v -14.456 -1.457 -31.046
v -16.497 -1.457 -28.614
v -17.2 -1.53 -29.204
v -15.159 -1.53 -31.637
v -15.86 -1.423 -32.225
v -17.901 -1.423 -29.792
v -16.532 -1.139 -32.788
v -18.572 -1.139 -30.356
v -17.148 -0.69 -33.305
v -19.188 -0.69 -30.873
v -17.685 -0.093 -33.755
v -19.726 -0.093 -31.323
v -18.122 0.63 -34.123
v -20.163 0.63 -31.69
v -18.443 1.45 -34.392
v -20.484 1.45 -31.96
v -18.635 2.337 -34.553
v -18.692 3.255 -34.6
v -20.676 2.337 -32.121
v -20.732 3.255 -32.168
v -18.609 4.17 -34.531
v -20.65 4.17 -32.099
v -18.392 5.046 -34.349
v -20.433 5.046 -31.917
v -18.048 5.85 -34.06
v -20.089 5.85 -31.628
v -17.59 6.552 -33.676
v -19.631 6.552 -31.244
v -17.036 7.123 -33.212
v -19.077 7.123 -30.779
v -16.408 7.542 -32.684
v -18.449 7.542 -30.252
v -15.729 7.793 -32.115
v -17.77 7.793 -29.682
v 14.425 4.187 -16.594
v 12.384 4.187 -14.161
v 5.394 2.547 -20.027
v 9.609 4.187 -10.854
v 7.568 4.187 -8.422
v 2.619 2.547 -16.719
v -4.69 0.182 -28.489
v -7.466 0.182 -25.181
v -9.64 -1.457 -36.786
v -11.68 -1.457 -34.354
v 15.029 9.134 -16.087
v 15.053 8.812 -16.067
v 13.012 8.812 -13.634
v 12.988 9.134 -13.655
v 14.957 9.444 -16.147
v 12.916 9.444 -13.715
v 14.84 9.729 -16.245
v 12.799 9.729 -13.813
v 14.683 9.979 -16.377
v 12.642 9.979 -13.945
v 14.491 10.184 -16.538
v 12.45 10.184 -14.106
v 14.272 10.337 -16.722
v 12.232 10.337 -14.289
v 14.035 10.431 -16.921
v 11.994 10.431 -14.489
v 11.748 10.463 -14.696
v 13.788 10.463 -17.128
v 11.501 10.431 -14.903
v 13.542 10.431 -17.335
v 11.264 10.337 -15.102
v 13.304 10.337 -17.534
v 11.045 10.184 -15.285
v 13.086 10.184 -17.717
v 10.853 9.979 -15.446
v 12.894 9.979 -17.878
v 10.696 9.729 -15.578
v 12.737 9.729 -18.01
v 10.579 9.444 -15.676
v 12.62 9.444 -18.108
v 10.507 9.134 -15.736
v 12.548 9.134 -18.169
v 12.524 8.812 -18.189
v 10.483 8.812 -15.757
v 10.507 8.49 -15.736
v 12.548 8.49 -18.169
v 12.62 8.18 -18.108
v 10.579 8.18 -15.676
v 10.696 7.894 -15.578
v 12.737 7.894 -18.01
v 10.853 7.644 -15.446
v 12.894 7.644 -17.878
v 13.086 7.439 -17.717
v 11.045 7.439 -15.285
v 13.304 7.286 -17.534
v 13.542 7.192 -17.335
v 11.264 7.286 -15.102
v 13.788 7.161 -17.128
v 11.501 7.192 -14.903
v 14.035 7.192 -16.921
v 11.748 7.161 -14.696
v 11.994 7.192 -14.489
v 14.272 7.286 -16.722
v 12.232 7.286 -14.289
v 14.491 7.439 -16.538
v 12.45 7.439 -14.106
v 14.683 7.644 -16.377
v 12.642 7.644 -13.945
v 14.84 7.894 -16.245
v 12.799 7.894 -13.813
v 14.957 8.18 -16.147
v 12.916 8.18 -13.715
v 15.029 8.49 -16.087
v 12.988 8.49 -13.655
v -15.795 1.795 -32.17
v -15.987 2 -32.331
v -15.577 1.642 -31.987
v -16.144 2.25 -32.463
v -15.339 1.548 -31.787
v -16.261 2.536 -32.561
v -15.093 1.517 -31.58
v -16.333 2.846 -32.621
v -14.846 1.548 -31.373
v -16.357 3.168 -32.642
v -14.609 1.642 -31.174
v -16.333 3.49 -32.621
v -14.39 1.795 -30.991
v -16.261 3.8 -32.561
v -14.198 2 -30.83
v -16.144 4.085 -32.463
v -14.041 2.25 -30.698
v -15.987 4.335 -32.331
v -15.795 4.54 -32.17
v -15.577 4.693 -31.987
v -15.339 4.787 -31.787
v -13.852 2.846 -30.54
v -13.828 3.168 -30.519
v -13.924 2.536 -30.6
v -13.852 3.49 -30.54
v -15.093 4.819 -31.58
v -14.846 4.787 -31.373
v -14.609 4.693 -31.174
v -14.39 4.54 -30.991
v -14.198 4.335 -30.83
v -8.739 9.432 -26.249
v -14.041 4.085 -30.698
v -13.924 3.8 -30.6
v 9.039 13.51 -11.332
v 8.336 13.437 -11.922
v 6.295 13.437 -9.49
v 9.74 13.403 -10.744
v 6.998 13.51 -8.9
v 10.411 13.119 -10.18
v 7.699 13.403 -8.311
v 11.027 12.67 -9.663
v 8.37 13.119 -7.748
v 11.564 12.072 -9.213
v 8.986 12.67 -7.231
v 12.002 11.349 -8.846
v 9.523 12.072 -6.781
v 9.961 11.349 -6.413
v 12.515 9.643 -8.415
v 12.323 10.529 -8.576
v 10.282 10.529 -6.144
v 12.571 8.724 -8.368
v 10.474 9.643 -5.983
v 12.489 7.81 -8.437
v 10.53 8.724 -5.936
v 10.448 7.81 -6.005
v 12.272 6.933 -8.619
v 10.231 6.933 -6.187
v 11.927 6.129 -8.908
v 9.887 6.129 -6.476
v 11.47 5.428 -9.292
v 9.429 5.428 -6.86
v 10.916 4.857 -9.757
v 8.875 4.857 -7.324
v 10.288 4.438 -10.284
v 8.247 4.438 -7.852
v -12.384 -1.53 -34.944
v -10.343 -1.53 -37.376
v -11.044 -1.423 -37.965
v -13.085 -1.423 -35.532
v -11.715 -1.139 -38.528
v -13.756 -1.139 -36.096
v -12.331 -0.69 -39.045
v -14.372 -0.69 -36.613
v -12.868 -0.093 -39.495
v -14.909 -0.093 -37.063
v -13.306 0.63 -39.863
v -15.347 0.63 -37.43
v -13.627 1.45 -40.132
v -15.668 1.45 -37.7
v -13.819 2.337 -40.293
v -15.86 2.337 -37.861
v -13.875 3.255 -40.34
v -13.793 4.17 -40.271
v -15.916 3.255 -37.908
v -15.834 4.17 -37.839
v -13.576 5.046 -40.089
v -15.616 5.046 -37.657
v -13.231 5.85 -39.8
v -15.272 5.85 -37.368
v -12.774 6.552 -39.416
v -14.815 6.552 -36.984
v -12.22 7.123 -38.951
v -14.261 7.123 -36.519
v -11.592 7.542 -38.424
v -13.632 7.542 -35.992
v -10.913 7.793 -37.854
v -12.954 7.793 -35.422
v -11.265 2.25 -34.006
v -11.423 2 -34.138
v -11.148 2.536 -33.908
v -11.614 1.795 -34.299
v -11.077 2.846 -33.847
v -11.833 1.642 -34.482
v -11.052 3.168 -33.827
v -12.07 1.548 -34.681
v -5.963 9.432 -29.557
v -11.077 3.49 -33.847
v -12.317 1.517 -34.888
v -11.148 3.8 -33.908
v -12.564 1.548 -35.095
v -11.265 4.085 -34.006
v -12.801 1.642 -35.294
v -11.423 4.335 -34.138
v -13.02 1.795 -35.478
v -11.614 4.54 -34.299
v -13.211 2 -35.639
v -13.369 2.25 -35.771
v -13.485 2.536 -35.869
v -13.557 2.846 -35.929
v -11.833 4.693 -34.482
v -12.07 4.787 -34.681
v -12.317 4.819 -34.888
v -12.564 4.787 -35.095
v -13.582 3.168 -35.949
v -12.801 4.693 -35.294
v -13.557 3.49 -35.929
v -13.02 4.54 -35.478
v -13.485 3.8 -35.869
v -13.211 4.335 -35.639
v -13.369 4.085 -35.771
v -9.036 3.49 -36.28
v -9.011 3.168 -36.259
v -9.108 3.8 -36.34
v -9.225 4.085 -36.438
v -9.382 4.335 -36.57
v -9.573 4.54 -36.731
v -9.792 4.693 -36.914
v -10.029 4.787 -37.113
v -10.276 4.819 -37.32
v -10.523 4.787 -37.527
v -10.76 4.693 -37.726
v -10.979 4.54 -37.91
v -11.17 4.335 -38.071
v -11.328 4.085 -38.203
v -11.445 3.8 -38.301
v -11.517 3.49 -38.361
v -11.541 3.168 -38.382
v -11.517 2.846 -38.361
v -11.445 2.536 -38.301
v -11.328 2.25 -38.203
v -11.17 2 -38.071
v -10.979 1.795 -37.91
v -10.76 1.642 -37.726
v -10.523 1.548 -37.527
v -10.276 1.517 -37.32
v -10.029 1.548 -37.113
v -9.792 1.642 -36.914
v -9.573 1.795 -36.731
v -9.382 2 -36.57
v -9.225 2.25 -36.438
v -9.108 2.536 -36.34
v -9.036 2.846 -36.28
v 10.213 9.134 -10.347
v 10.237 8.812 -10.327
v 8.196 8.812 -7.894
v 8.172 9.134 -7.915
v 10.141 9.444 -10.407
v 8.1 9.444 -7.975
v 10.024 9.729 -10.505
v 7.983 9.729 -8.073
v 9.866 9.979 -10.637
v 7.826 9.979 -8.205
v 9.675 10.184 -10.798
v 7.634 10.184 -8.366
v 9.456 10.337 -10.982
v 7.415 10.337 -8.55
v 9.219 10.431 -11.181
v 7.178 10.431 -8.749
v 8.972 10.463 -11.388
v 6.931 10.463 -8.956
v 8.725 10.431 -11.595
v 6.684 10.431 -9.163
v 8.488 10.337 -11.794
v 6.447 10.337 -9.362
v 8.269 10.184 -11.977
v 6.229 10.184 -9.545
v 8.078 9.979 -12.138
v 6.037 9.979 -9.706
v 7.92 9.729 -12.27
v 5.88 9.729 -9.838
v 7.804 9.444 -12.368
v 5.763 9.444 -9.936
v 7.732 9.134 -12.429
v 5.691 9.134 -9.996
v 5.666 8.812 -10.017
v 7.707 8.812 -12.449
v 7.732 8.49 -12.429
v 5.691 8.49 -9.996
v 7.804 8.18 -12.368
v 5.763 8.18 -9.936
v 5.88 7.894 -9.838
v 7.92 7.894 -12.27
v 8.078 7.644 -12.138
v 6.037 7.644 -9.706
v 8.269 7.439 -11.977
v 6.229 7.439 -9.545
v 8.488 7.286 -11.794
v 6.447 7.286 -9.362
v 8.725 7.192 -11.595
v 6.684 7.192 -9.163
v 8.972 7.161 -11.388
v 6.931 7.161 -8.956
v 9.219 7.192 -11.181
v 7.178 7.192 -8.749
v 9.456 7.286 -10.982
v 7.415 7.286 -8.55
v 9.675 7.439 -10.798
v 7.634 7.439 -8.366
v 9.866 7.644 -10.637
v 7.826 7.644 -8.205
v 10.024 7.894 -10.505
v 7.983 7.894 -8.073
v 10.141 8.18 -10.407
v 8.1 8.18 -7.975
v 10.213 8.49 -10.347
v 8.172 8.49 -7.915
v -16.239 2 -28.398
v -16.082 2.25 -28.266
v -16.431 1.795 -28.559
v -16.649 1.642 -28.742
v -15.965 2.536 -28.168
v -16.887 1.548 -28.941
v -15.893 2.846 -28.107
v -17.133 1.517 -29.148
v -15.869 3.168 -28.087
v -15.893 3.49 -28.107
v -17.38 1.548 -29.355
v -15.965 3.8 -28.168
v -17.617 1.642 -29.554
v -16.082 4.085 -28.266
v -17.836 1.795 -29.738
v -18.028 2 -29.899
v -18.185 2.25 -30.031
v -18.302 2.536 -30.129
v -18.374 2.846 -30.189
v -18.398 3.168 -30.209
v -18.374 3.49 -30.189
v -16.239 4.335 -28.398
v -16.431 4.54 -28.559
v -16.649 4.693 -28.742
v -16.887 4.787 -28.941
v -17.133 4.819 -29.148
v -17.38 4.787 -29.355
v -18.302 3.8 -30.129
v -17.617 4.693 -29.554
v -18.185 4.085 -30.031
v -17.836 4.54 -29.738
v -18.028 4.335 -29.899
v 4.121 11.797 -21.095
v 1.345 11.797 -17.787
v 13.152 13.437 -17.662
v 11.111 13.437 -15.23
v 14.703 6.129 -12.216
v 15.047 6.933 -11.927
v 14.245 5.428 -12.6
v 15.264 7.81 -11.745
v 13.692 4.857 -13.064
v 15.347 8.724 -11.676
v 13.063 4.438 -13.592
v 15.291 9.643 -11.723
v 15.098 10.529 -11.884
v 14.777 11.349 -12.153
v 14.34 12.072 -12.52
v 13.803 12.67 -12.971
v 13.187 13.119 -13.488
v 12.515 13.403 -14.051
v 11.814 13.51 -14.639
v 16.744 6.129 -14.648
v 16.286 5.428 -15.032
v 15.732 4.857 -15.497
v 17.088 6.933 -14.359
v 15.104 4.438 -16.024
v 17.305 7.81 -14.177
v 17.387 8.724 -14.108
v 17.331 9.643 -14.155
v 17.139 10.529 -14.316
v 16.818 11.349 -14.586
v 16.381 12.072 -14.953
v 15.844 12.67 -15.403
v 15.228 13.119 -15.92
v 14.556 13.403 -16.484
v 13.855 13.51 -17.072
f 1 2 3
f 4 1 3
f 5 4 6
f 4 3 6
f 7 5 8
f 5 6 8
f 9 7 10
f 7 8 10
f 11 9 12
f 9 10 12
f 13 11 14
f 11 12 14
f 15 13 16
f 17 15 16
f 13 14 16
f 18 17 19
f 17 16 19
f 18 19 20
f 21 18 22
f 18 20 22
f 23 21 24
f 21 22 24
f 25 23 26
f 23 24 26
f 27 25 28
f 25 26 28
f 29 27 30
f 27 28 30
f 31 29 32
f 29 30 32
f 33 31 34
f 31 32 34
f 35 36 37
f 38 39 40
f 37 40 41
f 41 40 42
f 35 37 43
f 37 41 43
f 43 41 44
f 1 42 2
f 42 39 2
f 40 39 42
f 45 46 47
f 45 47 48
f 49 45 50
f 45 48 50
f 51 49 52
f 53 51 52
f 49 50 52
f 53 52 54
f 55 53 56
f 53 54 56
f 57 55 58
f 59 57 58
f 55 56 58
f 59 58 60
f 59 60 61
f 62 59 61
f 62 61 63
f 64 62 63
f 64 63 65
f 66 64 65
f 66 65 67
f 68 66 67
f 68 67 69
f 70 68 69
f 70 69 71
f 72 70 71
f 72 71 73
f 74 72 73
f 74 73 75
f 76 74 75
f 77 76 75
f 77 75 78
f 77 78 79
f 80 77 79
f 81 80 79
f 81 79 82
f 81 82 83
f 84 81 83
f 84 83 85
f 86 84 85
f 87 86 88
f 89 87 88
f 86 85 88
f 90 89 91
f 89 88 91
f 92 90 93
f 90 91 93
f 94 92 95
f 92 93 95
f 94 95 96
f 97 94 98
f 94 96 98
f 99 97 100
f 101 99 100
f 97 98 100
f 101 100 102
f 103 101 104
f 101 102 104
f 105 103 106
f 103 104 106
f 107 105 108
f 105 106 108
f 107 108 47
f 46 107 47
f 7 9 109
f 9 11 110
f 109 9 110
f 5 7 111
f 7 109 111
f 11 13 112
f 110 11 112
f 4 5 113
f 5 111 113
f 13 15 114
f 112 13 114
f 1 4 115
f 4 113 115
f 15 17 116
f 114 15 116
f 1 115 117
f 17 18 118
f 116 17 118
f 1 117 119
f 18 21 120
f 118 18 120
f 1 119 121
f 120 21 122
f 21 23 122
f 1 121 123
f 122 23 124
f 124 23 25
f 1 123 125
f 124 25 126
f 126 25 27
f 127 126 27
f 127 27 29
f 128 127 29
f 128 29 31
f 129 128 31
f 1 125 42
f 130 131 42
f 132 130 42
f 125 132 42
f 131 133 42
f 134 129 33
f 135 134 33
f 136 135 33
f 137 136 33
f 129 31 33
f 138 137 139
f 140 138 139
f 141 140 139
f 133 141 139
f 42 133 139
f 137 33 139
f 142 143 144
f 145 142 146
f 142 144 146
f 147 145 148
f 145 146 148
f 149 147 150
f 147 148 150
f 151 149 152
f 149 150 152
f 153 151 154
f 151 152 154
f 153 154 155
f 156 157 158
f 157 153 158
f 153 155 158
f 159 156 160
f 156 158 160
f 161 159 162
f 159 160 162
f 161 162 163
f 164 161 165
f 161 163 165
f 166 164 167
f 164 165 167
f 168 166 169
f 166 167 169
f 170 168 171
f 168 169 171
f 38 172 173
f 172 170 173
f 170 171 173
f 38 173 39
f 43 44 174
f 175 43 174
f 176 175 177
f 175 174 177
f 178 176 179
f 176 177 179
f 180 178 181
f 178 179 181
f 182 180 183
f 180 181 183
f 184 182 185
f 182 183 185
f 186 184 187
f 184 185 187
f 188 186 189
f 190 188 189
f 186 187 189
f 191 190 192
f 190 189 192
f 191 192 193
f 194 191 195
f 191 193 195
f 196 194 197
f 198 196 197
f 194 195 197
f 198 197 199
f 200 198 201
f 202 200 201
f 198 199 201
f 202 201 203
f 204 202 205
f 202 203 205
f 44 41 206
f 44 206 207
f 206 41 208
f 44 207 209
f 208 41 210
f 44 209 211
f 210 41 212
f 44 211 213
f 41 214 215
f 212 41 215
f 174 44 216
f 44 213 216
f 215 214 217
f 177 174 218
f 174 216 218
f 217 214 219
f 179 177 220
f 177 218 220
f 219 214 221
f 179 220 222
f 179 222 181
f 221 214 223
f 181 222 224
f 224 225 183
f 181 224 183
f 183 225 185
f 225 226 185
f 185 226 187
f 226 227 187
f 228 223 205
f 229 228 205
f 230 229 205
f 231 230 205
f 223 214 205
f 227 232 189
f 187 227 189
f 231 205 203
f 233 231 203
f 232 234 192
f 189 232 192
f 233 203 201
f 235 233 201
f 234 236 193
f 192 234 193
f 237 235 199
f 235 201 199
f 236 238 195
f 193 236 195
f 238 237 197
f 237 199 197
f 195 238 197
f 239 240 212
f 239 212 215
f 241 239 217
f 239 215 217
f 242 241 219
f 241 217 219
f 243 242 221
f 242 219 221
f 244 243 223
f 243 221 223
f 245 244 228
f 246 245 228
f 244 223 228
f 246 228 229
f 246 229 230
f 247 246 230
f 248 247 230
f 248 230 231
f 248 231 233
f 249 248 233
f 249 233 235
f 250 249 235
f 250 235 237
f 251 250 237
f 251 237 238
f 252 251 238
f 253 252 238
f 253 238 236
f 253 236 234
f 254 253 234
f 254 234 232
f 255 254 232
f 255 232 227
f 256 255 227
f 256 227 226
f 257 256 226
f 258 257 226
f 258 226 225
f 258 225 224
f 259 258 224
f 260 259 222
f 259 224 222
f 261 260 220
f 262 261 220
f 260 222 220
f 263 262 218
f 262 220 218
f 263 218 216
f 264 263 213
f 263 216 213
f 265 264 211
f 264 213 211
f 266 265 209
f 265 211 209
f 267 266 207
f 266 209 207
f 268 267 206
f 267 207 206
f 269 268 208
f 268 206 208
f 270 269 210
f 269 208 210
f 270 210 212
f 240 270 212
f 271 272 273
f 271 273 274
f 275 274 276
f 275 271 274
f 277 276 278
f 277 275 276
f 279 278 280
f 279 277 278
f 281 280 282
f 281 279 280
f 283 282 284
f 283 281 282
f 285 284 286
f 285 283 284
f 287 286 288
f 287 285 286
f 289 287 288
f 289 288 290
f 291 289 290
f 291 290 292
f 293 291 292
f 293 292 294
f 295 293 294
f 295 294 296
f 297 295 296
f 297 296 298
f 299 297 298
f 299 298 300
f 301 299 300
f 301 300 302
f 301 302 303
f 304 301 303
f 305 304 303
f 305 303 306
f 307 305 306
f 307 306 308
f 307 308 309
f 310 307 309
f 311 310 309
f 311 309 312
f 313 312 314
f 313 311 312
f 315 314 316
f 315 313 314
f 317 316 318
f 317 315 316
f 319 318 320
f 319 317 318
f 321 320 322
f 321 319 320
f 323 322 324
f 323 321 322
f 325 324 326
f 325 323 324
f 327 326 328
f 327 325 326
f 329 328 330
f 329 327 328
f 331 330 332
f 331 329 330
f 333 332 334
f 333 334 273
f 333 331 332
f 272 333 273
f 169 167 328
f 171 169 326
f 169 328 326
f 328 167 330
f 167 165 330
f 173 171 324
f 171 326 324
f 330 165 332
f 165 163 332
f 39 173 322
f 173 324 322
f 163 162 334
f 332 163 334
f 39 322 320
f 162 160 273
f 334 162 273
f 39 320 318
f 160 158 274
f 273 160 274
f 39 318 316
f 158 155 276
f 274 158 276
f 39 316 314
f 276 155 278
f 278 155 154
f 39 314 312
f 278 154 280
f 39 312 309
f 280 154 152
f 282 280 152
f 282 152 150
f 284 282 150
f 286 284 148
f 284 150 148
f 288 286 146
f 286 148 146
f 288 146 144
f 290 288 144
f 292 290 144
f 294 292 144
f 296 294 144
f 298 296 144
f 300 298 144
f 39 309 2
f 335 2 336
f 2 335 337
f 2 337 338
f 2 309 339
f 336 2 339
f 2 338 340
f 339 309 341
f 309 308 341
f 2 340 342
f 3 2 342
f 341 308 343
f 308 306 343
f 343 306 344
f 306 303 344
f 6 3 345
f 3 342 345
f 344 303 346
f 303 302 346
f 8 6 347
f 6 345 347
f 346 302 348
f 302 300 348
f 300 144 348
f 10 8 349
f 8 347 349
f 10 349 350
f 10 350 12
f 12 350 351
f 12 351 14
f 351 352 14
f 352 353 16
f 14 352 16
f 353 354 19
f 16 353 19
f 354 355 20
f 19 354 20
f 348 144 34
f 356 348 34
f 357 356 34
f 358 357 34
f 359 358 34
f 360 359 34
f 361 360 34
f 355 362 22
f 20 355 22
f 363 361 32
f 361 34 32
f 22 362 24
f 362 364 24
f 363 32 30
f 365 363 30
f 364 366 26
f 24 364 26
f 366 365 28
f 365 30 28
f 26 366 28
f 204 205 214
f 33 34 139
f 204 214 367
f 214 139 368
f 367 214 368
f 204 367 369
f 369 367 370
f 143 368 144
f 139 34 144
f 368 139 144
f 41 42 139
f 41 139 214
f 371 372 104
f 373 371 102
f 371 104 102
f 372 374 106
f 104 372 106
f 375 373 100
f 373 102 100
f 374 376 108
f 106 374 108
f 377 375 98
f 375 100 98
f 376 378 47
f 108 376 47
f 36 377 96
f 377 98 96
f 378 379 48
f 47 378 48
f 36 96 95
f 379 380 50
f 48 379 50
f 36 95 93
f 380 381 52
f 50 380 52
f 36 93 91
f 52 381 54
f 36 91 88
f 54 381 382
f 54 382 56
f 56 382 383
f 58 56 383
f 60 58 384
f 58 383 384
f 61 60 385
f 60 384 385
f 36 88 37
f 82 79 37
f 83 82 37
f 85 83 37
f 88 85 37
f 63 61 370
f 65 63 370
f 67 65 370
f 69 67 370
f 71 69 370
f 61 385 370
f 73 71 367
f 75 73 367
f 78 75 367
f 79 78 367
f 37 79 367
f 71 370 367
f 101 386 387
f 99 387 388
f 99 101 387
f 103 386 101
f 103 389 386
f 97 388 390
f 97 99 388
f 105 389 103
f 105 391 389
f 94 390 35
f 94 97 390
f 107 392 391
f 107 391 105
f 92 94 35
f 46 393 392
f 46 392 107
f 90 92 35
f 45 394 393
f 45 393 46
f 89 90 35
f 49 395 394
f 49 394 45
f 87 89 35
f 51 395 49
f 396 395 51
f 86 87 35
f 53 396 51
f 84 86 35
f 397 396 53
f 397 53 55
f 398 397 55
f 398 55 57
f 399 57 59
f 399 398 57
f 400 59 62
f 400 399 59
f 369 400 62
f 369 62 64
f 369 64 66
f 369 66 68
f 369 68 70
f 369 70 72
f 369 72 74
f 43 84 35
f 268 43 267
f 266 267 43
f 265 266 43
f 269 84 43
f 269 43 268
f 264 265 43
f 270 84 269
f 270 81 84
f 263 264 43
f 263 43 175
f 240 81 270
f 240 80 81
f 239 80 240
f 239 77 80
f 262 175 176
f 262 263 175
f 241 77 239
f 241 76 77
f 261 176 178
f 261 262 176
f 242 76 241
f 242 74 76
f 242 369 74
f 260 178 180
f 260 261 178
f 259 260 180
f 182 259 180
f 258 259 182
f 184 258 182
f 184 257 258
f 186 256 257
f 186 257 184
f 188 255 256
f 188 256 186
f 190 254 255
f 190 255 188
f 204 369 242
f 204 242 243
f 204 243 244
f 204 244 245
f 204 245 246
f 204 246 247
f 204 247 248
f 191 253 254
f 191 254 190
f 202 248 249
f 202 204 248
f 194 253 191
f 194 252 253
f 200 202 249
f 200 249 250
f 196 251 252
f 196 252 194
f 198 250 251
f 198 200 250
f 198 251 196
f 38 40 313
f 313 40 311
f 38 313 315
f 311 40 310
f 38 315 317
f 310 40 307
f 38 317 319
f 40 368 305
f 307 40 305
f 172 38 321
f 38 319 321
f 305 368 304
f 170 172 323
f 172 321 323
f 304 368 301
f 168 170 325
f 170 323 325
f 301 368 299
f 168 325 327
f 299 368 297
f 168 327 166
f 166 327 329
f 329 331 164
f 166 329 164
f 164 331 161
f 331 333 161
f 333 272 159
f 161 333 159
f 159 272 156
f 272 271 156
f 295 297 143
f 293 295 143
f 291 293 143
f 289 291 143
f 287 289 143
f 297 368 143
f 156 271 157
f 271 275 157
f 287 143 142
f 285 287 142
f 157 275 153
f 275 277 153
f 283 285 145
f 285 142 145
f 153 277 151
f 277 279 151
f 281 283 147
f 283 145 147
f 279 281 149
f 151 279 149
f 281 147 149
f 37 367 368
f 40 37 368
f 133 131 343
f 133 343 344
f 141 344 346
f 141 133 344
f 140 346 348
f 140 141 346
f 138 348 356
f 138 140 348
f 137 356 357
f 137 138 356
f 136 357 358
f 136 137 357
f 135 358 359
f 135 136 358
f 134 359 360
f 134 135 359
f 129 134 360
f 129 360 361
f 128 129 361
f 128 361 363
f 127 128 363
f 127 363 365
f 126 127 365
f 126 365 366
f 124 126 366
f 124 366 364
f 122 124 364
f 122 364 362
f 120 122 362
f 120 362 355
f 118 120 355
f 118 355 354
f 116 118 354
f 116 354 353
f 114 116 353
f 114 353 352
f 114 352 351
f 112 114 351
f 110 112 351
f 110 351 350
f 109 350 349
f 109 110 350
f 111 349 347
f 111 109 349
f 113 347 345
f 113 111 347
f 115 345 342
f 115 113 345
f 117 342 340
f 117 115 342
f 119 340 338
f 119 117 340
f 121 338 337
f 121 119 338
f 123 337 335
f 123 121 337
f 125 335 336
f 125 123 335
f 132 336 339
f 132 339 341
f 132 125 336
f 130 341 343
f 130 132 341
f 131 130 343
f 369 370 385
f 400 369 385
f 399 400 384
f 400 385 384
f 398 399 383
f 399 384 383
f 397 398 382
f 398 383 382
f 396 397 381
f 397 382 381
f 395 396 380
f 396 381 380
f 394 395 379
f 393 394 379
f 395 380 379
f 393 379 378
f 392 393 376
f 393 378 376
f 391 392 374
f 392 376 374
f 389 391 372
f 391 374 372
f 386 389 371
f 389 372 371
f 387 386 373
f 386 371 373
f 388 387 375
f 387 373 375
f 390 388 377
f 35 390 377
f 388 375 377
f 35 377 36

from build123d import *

# Parameters (mm, degrees)
BOSS_EXTRUDE1_DEPTH      = 5.334
BOSS_EXTRUDE1_DEPTH_BACK = 5.334
SKETCH1_R                = 1.651
CUT_EXTRUDE1_DEPTH       = 10.414


with BuildPart() as part:
    # Sketch1 → Boss-Extrude1 (new, two sides: drawn at the far end of the back side and taken through both)
    with BuildSketch(Plane(origin=(10.702221059, 0, -12.754410396), x_dir=(0.7660444431189798, 0, 0.6427876096865374), z_dir=(-0.6427876096865374, 0, 0.7660444431189798)).offset(-BOSS_EXTRUDE1_DEPTH_BACK)):
        with BuildLine():
            Line((-32.691973638, 7.79265549), (-1.277889133, 13.436683202))
            ThreePointArc((-1.277889133, 13.436683202), (4.178001254, 9.642679764), (0.383997817, 4.186789377))
            Line((0.383997817, 4.186789377), (-31.030086688, -1.457238335))
            ThreePointArc((-31.030086688, -1.457238335), (-36.485977075, 2.336765102), (-32.691973638, 7.79265549))
        make_face()
        with Locations((-31.861030163, 3.167708577)):
            Circle(SKETCH1_R, mode=Mode.SUBTRACT)
        with Locations((-0.446945658, 8.811736289)):
            Circle(SKETCH1_R, mode=Mode.SUBTRACT)
    extrude(amount=BOSS_EXTRUDE1_DEPTH + BOSS_EXTRUDE1_DEPTH_BACK)

    # Sketch3 → Cut-Extrude1 (cut)
    with BuildSketch(Plane(origin=(-1.822096994, 13.238927242, -1.528920916), x_dir=(0.990782435050318, 0.13456837613179015, -0.015540866803864855), z_dir=(-0.13546278601801462, 0.9842406708429238, -0.1136667737859623))):
        Polygon((-17.612221816, 34.057028648), (-6.98123986, 24.993744329), (-4.17986107, 28.279684206), (-14.810843026, 37.342968525), align=None)
        Polygon((16.629373849, 10.539082885), (5.998391893, 19.602367204), (3.197013104, 16.316427327), (13.82799506, 7.253143007), align=None)
    extrude(amount=-CUT_EXTRUDE1_DEPTH, mode=Mode.SUBTRACT)


solid = part.part
